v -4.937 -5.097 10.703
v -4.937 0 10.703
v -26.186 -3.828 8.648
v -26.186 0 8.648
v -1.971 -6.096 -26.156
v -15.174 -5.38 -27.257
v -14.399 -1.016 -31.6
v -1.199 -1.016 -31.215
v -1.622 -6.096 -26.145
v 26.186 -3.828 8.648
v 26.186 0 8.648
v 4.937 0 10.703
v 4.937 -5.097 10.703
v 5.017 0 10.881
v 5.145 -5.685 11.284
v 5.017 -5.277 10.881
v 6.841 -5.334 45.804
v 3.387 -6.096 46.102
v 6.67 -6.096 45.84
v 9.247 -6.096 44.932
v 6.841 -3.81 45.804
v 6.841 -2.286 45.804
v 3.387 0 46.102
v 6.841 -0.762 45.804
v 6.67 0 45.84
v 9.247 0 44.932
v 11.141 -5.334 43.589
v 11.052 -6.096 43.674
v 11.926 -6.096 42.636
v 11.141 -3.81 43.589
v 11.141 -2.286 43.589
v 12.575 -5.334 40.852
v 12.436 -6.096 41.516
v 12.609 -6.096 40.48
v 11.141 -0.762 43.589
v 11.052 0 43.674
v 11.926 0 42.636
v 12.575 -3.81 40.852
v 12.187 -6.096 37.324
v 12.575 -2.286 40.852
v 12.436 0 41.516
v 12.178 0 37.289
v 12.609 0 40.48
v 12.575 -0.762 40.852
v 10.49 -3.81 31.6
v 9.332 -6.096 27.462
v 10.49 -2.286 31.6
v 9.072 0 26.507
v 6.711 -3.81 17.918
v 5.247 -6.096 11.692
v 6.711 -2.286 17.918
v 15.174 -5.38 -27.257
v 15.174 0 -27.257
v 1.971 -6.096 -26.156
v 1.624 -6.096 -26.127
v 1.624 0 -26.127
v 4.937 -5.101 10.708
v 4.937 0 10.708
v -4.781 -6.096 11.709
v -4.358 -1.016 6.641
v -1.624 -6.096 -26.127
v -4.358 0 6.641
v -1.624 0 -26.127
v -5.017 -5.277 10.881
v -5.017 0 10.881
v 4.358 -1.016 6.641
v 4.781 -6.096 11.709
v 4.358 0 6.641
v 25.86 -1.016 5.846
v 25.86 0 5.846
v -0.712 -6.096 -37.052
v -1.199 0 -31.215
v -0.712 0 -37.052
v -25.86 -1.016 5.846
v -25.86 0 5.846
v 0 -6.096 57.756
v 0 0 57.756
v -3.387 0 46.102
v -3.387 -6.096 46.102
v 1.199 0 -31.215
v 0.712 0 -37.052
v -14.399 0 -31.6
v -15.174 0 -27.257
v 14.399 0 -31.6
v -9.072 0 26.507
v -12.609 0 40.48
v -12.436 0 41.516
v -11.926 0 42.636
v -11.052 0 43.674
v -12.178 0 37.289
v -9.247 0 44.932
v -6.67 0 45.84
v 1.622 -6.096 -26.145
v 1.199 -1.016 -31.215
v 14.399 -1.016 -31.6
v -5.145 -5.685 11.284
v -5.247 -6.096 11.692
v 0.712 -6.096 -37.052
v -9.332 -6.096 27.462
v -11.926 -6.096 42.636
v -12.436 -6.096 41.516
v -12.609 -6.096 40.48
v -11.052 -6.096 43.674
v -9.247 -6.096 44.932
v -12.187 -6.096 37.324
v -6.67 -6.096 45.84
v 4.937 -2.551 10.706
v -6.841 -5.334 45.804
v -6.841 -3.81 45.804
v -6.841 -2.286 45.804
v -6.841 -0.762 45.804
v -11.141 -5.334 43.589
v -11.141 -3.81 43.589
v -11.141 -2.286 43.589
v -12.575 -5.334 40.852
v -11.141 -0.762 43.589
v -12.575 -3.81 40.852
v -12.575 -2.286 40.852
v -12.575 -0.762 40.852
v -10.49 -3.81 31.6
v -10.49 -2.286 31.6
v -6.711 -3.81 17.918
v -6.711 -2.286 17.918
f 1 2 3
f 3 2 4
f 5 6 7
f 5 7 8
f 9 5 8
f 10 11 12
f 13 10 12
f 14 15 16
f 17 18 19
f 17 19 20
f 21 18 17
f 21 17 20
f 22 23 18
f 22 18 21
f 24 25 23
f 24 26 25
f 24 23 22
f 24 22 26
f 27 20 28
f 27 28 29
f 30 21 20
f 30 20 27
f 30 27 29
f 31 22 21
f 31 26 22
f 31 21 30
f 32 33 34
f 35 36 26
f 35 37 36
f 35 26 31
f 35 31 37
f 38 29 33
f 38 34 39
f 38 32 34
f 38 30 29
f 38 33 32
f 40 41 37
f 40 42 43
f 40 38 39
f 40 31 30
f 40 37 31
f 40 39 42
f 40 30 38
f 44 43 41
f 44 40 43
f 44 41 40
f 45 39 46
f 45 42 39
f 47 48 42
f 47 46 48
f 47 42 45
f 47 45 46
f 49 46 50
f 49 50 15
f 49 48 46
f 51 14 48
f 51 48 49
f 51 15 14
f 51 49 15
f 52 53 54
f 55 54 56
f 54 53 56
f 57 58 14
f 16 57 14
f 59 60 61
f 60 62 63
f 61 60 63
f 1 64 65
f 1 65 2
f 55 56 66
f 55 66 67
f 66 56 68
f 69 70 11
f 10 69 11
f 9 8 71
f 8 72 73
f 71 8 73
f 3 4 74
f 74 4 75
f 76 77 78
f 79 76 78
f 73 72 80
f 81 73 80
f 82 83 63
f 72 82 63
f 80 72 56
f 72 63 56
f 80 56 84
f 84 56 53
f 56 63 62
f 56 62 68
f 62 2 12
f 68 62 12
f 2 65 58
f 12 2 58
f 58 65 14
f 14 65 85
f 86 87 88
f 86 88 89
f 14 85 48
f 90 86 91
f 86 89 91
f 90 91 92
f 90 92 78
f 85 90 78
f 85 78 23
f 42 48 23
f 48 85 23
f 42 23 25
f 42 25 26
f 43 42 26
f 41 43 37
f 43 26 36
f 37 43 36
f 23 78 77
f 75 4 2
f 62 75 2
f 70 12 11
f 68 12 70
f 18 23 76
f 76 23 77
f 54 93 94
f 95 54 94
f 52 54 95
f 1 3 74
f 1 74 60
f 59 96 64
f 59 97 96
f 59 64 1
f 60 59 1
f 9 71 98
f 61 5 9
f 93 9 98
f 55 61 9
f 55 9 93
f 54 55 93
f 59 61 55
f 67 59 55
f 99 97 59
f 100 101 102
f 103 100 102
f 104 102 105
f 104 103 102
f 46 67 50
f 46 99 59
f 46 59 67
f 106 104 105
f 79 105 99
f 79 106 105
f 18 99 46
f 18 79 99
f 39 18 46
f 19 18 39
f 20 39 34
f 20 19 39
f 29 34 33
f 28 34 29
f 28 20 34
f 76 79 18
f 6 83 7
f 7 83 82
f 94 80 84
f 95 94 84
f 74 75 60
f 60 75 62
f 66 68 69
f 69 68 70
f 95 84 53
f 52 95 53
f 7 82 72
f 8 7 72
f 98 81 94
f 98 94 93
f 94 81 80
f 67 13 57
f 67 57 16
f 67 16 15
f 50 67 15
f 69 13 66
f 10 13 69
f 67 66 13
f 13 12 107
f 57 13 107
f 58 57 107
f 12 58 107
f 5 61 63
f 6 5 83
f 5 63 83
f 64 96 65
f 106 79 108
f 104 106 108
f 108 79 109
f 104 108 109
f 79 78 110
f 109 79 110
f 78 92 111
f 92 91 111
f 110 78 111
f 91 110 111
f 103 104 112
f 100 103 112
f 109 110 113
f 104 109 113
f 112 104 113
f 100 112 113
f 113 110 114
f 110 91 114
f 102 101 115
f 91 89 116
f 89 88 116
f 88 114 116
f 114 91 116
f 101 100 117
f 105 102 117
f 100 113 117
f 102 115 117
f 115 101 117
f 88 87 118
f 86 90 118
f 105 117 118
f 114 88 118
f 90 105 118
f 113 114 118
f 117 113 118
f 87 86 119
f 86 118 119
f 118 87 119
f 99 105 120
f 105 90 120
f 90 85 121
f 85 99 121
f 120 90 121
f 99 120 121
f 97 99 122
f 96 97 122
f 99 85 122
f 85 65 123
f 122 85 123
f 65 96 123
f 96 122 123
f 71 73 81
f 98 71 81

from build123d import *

# Parameters (mm, degrees)
F1_DEPTH = 6.096
F2_SIZE  = 5.08
F3_SIZE  = 5.08
F4_SIZE  = 5.08
F5_SIZE  = 5.08


with BuildPart() as f1:
    # F0 (on Front) → F1 (new body)
    with BuildSketch(Plane.XZ):
        with BuildLine():
            Line((0, 20.2803085162), (0, 45.9340810776))
            add(Edge.make_bspline(
                [(0, 45.9340810776), (-1.1389014306, 46.0114949237), (-2.2794765797, 46.0908397164), (-3.3874711399, 46.1016858359)],
                knots=[0, 0, 0, 0, 0.0644331464, 0.0644331464, 0.0644331464, 0.0644331464], degree=3))
            add(Edge.make_bspline(
                [(-3.3874711399, 46.1016858359), (-4.5918937858, 46.1134758865), (-7.6399537199, 45.932697384), (-11.3500527225, 43.9131780528), (-12.9919049147, 40.8775722979), (-12.0912484402, 36.5949284774), (-10.4183061964, 31.6267656453), (-8.4874951951, 24.1961510451), (-6.8598737351, 19.0046316817), (-5.1160297689, 10.9332008272), (-5.0169141032, 10.8808381483)],
                knots=[0.0644331464, 0.0644331464, 0.0644331464, 0.0644331464, 0.13447387, 0.2475396431, 0.3378948434, 0.4416458535, 0.5615697227, 0.7004964526, 0.8354523914, 0.9737557397, 0.9737557397, 0.9737557397, 0.9737557397], degree=3))
            Line((-5.0169141032, 10.8808381483), (-4.9365200102, 10.7033615932))
            add(Edge.make_bspline(
                [(0, 20.2803085162), (-5.1031475964, 20.2803085162), (-4.9365200102, 10.7033615932)],
                knots=[3.1415926536, 3.1415926536, 3.1415926536, 4.7450467089, 4.7450467089, 4.7450467089], degree=2, weights=[1, 0.6954667772, 1]))
        make_face()
        with BuildLine():
            add(Edge.make_bspline(
                [(0, 45.9340810776), (1.1389014306, 46.0114949237), (2.2794765797, 46.0908397164), (3.3874711399, 46.1016858359)],
                knots=[0, 0, 0, 0, 0.0644331464, 0.0644331464, 0.0644331464, 0.0644331464], degree=3))
            Line((0, 45.9340810776), (0, 20.2803085162))
            add(Edge.make_bspline(
                [(4.9365969051, 10.7078139024), (5.1006956981, 20.2803085162), (0, 20.2803085162)],
                knots=[1.5386189291, 1.5386189291, 1.5386189291, 3.1415926536, 3.1415926536, 3.1415926536], degree=2, weights=[1, 0.6956393299, 1]))
            Line((4.9365969051, 10.7078139024), (5.0169141032, 10.8808381483))
            add(Edge.make_bspline(
                [(3.3874711399, 46.1016858359), (4.5918937858, 46.1134758865), (7.6399537199, 45.932697384), (11.3500527225, 43.9131780528), (12.9919049147, 40.8775722979), (12.0912484402, 36.5949284774), (10.4183061964, 31.6267656453), (8.4874951951, 24.1961510451), (6.8598737351, 19.0046316817), (5.1160297689, 10.9332008272), (5.0169141032, 10.8808381483)],
                knots=[0.0644331464, 0.0644331464, 0.0644331464, 0.0644331464, 0.13447387, 0.2475396431, 0.3378948434, 0.4416458535, 0.5615697227, 0.7004964526, 0.8354523914, 0.9737557397, 0.9737557397, 0.9737557397, 0.9737557397], degree=3))
        make_face()
        with BuildLine():
            add(Edge.make_bspline(
                [(0, 45.9340810776), (-1.1389014306, 46.0114949237), (-2.2794765797, 46.0908397164), (-3.3874711399, 46.1016858359)],
                knots=[0, 0, 0, 0, 0.0644331464, 0.0644331464, 0.0644331464, 0.0644331464], degree=3))
            add(Edge.make_bspline(
                [(0, 45.9340810776), (1.1389014306, 46.0114949237), (2.2794765797, 46.0908397164), (3.3874711399, 46.1016858359)],
                knots=[0, 0, 0, 0, 0.0644331464, 0.0644331464, 0.0644331464, 0.0644331464], degree=3))
            Line((3.3874711399, 46.1016858359), (0, 57.755921036))
            Line((0, 57.755921036), (-3.3874711399, 46.1016858359))
        make_face()
        with BuildLine():
            Line((0, 1.7320509615), (0, 20.2803085162))
            add(Edge.make_bspline(
                [(0, 20.2803085162), (-5.1031475964, 20.2803085162), (-4.9365200102, 10.7033615932)],
                knots=[3.1415926536, 3.1415926536, 3.1415926536, 4.7450467089, 4.7450467089, 4.7450467089], degree=2, weights=[1, 0.6954667772, 1]))
            add(Edge.make_bspline(
                [(-4.9365200102, 10.7033615932), (-4.898983165, 8.5459254669), (-4.3579266312, 6.641355379)],
                knots=[4.7450467089, 4.7450467089, 4.7450467089, 5.2024108881, 5.2024108881, 5.2024108881], degree=2, weights=[1, 0.9739660033, 1]))
            add(Edge.make_bspline(
                [(-4.3579266312, 6.641355379), (-2.9632752876, 1.7320509615), (0, 1.7320509615)],
                knots=[5.2024108881, 5.2024108881, 5.2024108881, 6.2831853072, 6.2831853072, 6.2831853072], degree=2, weights=[1, 0.8575095387, 1]))
        make_face()
        with BuildLine():
            add(Edge.make_bspline(
                [(4.9365969051, 10.7078139024), (5.1006956981, 20.2803085162), (0, 20.2803085162)],
                knots=[1.5386189291, 1.5386189291, 1.5386189291, 3.1415926536, 3.1415926536, 3.1415926536], degree=2, weights=[1, 0.6956393299, 1]))
            Line((0, 20.2803085162), (0, 1.7320509615))
            add(Edge.make_bspline(
                [(0, 1.7320509615), (2.9632752876, 1.7320509615), (4.3579266312, 6.641355379)],
                knots=[0, 0, 0, 1.0807744191, 1.0807744191, 1.0807744191], degree=2, weights=[1, 0.8575095387, 1]))
            add(Edge.make_bspline(
                [(4.3579266312, 6.641355379), (4.898983165, 8.5459254669), (4.9365200102, 10.7033615932)],
                knots=[1.0807744191, 1.0807744191, 1.0807744191, 1.5381385983, 1.5381385983, 1.5381385983], degree=2, weights=[1, 0.9739660033, 1]))
            add(Edge.make_bspline(
                [(4.9365200102, 10.7033615932), (4.9365587424, 10.7055877305), (4.9365969051, 10.7078139024)],
                knots=[1.5381385983, 1.5381385983, 1.5381385983, 1.5386189291, 1.5386189291, 1.5386189291], degree=2, weights=[1, 0.9999999712, 1]))
        make_face()
        with BuildLine():
            Line((26.1861383915, 8.6479401216), (4.9365200102, 10.7033615932))
            add(Edge.make_bspline(
                [(4.3579266312, 6.641355379), (4.898983165, 8.5459254669), (4.9365200102, 10.7033615932)],
                knots=[1.0807744191, 1.0807744191, 1.0807744191, 1.5381385983, 1.5381385983, 1.5381385983], degree=2, weights=[1, 0.9739660033, 1]))
            Line((4.3579266312, 6.641355379), (25.8603654802, 5.8462861925))
            Line((25.8603654802, 5.8462861925), (26.1861383915, 8.6479401216))
        make_face()
        with BuildLine():
            add(Edge.make_bspline(
                [(-4.9365200102, 10.7033615932), (-4.898983165, 8.5459254669), (-4.3579266312, 6.641355379)],
                knots=[4.7450467089, 4.7450467089, 4.7450467089, 5.2024108881, 5.2024108881, 5.2024108881], degree=2, weights=[1, 0.9739660033, 1]))
            Line((-4.9365200102, 10.7033615932), (-26.1861383915, 8.6479401216))
            Line((-26.1861383915, 8.6479401216), (-25.8603654802, 5.8462861925))
            Line((-25.8603654802, 5.8462861925), (-4.3579266312, 6.641355379))
        make_face()
        with BuildLine():
            Line((0, -37.0522124614), (0, 1.7320509615))
            add(Edge.make_bspline(
                [(-4.3579266312, 6.641355379), (-2.9632752876, 1.7320509615), (0, 1.7320509615)],
                knots=[5.2024108881, 5.2024108881, 5.2024108881, 6.2831853072, 6.2831853072, 6.2831853072], degree=2, weights=[1, 0.8575095387, 1]))
            Line((-4.3579266312, 6.641355379), (-1.6238323207, -26.1266239599))
            Line((-1.6238323207, -26.1266239599), (-1.1992467089, -31.2152606249))
            Line((-1.1992467089, -31.2152606249), (-0.7122231839, -37.0522124614))
            Line((-0.7122231839, -37.0522124614), (0, -37.0522124614))
        make_face()
        with BuildLine():
            add(Edge.make_bspline(
                [(0, 1.7320509615), (2.9632752876, 1.7320509615), (4.3579266312, 6.641355379)],
                knots=[0, 0, 0, 1.0807744191, 1.0807744191, 1.0807744191], degree=2, weights=[1, 0.8575095387, 1]))
            Line((0, 1.7320509615), (0, -37.0522124614))
            Line((0, -37.0522124614), (0.7122231839, -37.0522124614))
            Line((0.7122231839, -37.0522124614), (1.1992467089, -31.2152606249))
            Line((1.1992467089, -31.2152606249), (1.6238323207, -26.1266239599))
            Line((1.6238323207, -26.1266239599), (4.3579266312, 6.641355379))
        make_face()
        Polygon((15.173734748, -27.257200574), (1.6238323207, -26.1266239599), (1.1992467089, -31.2152606249), (14.3991941586, -31.6000394523), align=None)
        Polygon((-1.1992467089, -31.2152606249), (-1.6238323207, -26.1266239599), (-15.173734748, -27.257200574), (-14.3991941586, -31.6000394523), align=None)
    extrude(amount=F1_DEPTH)

    # F2
    f2_edges = [f1.edges().sort_by_distance(p)[0] for p in [
        (-15.109146, -6.096, 6.243821),
    ]]
    chamfer(f2_edges, length=F2_SIZE)

    # F3
    f3_edges = [f1.edges().sort_by_distance(p)[0] for p in [
        (15.109146, -6.096, 6.243821),
    ]]
    chamfer(f3_edges, length=F3_SIZE)

    # F4
    f4_edges = [f1.edges().sort_by_distance(p)[0] for p in [
        (-7.79922, -6.096, -31.40765),
    ]]
    chamfer(f4_edges, length=F4_SIZE)

    # F5
    f5_edges = [f1.edges().sort_by_distance(p)[0] for p in [
        (7.79922, -6.096, -31.40765),
    ]]
    chamfer(f5_edges, length=F5_SIZE)


solid = f1.part
